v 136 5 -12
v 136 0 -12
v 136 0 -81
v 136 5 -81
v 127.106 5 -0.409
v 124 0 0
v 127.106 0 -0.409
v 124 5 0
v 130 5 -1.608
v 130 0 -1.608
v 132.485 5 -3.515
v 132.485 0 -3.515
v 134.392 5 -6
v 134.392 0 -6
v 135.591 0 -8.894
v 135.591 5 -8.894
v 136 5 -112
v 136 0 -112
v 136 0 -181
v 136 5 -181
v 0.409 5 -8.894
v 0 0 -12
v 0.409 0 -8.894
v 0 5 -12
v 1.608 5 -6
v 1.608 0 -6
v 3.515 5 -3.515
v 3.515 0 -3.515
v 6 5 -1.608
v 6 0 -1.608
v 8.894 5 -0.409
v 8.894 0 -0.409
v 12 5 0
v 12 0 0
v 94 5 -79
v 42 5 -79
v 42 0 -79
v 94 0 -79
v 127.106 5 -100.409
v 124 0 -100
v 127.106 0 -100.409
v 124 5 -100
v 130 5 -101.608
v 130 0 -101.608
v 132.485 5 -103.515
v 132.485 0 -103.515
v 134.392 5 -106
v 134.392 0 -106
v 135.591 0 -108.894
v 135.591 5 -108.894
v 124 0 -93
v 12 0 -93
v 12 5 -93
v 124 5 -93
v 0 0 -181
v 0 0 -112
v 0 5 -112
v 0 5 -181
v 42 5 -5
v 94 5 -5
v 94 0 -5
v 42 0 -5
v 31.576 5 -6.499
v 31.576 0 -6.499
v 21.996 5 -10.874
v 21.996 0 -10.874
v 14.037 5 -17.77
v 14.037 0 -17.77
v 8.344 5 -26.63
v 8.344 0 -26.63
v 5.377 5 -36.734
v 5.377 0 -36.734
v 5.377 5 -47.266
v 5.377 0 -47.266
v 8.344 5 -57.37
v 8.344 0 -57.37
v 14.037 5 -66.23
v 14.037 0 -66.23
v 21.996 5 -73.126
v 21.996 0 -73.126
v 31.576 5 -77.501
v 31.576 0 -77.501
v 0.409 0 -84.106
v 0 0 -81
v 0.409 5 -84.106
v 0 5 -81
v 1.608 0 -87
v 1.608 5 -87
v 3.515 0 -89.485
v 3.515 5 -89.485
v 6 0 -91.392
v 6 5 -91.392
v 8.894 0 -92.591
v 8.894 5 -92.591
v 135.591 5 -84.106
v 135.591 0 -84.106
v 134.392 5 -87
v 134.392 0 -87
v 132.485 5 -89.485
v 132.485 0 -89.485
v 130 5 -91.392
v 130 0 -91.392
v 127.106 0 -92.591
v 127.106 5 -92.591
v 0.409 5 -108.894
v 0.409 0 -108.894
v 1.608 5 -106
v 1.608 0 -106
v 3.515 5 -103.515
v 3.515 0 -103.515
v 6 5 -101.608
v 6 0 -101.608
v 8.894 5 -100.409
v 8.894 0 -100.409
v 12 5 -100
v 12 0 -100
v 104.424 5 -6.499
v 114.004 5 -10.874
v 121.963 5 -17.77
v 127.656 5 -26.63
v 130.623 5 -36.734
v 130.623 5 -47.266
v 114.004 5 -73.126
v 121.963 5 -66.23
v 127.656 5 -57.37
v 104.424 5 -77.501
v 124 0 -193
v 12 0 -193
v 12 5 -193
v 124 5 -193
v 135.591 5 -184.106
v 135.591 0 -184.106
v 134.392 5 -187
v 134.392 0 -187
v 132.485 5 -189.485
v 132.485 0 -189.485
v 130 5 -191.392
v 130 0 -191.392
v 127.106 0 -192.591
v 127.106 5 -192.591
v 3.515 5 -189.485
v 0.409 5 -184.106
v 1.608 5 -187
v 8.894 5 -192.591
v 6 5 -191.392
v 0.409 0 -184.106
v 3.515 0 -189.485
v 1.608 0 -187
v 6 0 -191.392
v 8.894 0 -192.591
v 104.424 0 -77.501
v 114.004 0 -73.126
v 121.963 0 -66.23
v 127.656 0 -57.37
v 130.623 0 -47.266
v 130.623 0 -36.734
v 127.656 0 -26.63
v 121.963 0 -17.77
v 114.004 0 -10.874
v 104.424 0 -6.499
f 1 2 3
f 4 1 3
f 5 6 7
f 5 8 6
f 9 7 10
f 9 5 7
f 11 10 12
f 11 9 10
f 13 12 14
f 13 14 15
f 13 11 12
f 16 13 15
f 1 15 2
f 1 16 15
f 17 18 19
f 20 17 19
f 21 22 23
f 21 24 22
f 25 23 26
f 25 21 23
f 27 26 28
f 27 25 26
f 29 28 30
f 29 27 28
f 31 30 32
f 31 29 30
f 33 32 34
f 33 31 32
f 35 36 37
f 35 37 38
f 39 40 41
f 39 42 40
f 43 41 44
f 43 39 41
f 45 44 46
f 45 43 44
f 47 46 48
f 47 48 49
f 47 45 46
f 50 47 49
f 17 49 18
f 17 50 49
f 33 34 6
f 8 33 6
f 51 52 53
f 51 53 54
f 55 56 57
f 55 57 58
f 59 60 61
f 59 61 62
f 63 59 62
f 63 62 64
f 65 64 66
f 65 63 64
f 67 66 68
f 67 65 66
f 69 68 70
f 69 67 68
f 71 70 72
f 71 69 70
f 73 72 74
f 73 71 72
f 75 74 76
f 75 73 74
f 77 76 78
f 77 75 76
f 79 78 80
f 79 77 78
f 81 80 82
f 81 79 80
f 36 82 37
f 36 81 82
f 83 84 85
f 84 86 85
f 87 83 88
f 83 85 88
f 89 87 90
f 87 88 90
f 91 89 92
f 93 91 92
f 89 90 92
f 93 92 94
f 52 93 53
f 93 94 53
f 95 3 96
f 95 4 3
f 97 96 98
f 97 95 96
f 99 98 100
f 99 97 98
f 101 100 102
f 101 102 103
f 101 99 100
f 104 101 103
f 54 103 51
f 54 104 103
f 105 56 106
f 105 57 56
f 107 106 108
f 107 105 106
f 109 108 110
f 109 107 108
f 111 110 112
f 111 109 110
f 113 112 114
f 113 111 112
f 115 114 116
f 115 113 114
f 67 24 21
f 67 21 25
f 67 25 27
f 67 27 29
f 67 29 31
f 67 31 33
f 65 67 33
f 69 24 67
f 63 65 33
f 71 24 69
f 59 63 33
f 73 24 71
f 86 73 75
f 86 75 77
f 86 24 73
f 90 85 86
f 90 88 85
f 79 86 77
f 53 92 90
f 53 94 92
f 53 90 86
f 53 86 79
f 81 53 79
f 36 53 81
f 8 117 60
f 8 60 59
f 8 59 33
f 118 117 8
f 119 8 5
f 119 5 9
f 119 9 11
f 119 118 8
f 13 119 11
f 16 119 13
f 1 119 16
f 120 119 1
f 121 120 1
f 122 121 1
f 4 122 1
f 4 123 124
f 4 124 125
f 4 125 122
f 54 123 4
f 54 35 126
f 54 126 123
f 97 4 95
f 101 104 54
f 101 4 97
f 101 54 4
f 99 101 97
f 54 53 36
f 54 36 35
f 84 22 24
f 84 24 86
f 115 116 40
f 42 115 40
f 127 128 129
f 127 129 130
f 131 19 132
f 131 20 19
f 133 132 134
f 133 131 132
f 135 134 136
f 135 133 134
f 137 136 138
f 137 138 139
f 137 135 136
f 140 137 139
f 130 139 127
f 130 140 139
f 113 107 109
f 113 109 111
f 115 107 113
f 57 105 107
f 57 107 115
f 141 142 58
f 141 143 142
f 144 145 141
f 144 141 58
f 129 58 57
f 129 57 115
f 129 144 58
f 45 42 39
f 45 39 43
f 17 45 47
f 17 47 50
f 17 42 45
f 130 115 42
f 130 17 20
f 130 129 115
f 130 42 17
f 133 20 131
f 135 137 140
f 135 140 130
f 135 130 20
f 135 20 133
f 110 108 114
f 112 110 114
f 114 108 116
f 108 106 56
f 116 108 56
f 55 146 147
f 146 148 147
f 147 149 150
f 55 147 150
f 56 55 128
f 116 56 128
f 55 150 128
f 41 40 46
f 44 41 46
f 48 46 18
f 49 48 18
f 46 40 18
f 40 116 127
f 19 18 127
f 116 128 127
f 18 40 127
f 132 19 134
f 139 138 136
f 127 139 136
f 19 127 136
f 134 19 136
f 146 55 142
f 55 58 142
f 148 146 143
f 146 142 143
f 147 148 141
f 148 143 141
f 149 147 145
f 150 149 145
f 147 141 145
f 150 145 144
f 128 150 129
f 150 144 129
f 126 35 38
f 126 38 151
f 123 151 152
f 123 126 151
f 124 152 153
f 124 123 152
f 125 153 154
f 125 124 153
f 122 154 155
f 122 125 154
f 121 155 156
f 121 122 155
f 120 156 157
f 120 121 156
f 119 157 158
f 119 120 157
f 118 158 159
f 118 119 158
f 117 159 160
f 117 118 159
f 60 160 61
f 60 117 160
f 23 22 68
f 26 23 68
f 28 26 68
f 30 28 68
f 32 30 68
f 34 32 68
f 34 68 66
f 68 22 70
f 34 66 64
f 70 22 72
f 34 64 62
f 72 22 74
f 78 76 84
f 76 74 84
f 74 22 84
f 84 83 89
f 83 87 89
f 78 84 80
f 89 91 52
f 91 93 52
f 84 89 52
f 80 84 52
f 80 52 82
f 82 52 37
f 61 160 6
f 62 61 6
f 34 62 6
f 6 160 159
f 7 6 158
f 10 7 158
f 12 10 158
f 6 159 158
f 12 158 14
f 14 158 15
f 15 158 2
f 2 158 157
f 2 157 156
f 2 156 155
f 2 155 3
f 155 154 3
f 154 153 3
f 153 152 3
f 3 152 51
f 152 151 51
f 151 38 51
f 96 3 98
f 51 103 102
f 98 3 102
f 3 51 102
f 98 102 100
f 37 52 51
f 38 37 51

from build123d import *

# Parameters (mm, degrees)
SKETCH1_W           = 136
SKETCH1_H           = 93
BOSS_EXTRUDE1_DEPTH = 5
FILLET1_R           = 12
CUT_EXTRUDE1_DEPTH  = 237.15672762


with BuildPart() as part:
    # Sketch1 → Boss-Extrude1 (new body)
    with BuildSketch(Plane(origin=(0, 0, 0), x_dir=(1, 0, 0), z_dir=(0, 1, 0))):
        with Locations((68, 46.5)):
            Rectangle(SKETCH1_W, SKETCH1_H)
    extrude(amount=BOSS_EXTRUDE1_DEPTH)

    # Fillet1
    fillet1_edges = [part.edges().sort_by_distance(p)[0] for p in [
        (0, 2.5, -93),
        (136, 2.5, -93),
        (136, 2.5, 0),
        (0, 2.5, 0),
    ]]
    fillet(fillet1_edges, radius=FILLET1_R)


with BuildPart() as body_2:
    # Body-Move/Copy1: copy of part
    add(part.part.moved(Location((0, 0, -100))))


with BuildPart() as part_1:
    add(part.part)

    # Sketch2 → Cut-Extrude1 (cut, through all)
    with BuildSketch(Plane(origin=(0, 5, 0), x_dir=(1, 0, 0), z_dir=(0, 1, 0))):
        with BuildLine():
            Line((42, 79), (94, 79))
            ThreePointArc((94, 79), (131, 42), (94, 5))
            Line((94, 5), (42, 5))
            ThreePointArc((42, 5), (5, 42), (42, 79))
        make_face()
    extrude(amount=-CUT_EXTRUDE1_DEPTH, mode=Mode.SUBTRACT)


solid = Compound([body_2.part, part_1.part])
